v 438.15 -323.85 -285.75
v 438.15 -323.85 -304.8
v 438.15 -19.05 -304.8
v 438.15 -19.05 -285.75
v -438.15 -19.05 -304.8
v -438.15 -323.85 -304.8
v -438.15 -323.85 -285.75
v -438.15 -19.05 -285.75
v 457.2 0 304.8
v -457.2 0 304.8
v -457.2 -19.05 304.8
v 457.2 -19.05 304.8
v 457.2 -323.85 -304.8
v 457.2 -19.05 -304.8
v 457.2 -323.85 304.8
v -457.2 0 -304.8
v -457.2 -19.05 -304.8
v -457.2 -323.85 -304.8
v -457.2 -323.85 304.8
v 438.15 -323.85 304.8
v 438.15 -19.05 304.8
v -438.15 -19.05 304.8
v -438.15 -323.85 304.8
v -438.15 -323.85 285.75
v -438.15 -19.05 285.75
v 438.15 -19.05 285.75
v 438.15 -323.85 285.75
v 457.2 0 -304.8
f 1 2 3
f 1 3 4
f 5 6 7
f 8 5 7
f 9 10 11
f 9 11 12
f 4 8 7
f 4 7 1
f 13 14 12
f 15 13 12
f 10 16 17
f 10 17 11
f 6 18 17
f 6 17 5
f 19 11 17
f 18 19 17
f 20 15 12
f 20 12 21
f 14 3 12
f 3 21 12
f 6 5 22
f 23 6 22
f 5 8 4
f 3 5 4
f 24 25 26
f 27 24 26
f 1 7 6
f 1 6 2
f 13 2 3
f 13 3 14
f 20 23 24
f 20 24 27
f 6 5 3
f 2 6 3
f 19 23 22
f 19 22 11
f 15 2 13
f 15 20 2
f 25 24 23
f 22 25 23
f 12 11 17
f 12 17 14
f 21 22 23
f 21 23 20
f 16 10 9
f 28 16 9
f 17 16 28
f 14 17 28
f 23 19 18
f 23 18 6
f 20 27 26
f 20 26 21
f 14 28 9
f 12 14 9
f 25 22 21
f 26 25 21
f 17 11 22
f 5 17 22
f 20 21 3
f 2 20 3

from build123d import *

# Parameters (mm, degrees)
F0_W     = 914.4
F0_H     = 609.6
F1_DEPTH = 19.05
F3_DEPTH = 304.8
F2_W     = 876.3
F2_H     = 19.05
F4_DEPTH = 304.8
F5_DEPTH = 304.8
F6_DEPTH = 304.8


with BuildPart() as f1:
    # F0 (on Front) → F1 (new body)
    with BuildSketch(Plane.XZ):
        Rectangle(F0_W, F0_H)
    extrude(amount=F1_DEPTH)


with BuildPart() as f3:
    # F2 (on face) → F3 (new body)
    with BuildSketch(Plane.XZ.offset(19.05)):
        Polygon((-457.2, 304.8), (-457.2, -304.8), (-438.15, -304.8), (-438.15, -285.75), (-438.15, 285.75), (-438.15, 304.8), align=None)
    extrude(amount=F3_DEPTH)


with BuildPart() as f4:
    # F2 (on face) → F4 (new body, through all)
    with BuildSketch(Plane.XZ.offset(19.05)):
        with Locations((0, -295.275)):
            Rectangle(F2_W, F2_H)
    extrude(amount=F4_DEPTH)


with BuildPart() as f5:
    # F2 (on face) → F5 (new body, through all)
    with BuildSketch(Plane.XZ.offset(19.05)):
        with Locations((0, 295.275)):
            Rectangle(F2_W, F2_H)
    extrude(amount=F5_DEPTH)


with BuildPart() as f6:
    # F2 (on face) → F6 (new body, through all)
    with BuildSketch(Plane.XZ.offset(19.05)):
        Polygon((438.15, -285.75), (438.15, -304.8), (457.2, -304.8), (457.2, 304.8), (438.15, 304.8), (438.15, 285.75), align=None)
    extrude(amount=F6_DEPTH)


solid = Compound([f1.part, f3.part, f4.part, f5.part, f6.part])
